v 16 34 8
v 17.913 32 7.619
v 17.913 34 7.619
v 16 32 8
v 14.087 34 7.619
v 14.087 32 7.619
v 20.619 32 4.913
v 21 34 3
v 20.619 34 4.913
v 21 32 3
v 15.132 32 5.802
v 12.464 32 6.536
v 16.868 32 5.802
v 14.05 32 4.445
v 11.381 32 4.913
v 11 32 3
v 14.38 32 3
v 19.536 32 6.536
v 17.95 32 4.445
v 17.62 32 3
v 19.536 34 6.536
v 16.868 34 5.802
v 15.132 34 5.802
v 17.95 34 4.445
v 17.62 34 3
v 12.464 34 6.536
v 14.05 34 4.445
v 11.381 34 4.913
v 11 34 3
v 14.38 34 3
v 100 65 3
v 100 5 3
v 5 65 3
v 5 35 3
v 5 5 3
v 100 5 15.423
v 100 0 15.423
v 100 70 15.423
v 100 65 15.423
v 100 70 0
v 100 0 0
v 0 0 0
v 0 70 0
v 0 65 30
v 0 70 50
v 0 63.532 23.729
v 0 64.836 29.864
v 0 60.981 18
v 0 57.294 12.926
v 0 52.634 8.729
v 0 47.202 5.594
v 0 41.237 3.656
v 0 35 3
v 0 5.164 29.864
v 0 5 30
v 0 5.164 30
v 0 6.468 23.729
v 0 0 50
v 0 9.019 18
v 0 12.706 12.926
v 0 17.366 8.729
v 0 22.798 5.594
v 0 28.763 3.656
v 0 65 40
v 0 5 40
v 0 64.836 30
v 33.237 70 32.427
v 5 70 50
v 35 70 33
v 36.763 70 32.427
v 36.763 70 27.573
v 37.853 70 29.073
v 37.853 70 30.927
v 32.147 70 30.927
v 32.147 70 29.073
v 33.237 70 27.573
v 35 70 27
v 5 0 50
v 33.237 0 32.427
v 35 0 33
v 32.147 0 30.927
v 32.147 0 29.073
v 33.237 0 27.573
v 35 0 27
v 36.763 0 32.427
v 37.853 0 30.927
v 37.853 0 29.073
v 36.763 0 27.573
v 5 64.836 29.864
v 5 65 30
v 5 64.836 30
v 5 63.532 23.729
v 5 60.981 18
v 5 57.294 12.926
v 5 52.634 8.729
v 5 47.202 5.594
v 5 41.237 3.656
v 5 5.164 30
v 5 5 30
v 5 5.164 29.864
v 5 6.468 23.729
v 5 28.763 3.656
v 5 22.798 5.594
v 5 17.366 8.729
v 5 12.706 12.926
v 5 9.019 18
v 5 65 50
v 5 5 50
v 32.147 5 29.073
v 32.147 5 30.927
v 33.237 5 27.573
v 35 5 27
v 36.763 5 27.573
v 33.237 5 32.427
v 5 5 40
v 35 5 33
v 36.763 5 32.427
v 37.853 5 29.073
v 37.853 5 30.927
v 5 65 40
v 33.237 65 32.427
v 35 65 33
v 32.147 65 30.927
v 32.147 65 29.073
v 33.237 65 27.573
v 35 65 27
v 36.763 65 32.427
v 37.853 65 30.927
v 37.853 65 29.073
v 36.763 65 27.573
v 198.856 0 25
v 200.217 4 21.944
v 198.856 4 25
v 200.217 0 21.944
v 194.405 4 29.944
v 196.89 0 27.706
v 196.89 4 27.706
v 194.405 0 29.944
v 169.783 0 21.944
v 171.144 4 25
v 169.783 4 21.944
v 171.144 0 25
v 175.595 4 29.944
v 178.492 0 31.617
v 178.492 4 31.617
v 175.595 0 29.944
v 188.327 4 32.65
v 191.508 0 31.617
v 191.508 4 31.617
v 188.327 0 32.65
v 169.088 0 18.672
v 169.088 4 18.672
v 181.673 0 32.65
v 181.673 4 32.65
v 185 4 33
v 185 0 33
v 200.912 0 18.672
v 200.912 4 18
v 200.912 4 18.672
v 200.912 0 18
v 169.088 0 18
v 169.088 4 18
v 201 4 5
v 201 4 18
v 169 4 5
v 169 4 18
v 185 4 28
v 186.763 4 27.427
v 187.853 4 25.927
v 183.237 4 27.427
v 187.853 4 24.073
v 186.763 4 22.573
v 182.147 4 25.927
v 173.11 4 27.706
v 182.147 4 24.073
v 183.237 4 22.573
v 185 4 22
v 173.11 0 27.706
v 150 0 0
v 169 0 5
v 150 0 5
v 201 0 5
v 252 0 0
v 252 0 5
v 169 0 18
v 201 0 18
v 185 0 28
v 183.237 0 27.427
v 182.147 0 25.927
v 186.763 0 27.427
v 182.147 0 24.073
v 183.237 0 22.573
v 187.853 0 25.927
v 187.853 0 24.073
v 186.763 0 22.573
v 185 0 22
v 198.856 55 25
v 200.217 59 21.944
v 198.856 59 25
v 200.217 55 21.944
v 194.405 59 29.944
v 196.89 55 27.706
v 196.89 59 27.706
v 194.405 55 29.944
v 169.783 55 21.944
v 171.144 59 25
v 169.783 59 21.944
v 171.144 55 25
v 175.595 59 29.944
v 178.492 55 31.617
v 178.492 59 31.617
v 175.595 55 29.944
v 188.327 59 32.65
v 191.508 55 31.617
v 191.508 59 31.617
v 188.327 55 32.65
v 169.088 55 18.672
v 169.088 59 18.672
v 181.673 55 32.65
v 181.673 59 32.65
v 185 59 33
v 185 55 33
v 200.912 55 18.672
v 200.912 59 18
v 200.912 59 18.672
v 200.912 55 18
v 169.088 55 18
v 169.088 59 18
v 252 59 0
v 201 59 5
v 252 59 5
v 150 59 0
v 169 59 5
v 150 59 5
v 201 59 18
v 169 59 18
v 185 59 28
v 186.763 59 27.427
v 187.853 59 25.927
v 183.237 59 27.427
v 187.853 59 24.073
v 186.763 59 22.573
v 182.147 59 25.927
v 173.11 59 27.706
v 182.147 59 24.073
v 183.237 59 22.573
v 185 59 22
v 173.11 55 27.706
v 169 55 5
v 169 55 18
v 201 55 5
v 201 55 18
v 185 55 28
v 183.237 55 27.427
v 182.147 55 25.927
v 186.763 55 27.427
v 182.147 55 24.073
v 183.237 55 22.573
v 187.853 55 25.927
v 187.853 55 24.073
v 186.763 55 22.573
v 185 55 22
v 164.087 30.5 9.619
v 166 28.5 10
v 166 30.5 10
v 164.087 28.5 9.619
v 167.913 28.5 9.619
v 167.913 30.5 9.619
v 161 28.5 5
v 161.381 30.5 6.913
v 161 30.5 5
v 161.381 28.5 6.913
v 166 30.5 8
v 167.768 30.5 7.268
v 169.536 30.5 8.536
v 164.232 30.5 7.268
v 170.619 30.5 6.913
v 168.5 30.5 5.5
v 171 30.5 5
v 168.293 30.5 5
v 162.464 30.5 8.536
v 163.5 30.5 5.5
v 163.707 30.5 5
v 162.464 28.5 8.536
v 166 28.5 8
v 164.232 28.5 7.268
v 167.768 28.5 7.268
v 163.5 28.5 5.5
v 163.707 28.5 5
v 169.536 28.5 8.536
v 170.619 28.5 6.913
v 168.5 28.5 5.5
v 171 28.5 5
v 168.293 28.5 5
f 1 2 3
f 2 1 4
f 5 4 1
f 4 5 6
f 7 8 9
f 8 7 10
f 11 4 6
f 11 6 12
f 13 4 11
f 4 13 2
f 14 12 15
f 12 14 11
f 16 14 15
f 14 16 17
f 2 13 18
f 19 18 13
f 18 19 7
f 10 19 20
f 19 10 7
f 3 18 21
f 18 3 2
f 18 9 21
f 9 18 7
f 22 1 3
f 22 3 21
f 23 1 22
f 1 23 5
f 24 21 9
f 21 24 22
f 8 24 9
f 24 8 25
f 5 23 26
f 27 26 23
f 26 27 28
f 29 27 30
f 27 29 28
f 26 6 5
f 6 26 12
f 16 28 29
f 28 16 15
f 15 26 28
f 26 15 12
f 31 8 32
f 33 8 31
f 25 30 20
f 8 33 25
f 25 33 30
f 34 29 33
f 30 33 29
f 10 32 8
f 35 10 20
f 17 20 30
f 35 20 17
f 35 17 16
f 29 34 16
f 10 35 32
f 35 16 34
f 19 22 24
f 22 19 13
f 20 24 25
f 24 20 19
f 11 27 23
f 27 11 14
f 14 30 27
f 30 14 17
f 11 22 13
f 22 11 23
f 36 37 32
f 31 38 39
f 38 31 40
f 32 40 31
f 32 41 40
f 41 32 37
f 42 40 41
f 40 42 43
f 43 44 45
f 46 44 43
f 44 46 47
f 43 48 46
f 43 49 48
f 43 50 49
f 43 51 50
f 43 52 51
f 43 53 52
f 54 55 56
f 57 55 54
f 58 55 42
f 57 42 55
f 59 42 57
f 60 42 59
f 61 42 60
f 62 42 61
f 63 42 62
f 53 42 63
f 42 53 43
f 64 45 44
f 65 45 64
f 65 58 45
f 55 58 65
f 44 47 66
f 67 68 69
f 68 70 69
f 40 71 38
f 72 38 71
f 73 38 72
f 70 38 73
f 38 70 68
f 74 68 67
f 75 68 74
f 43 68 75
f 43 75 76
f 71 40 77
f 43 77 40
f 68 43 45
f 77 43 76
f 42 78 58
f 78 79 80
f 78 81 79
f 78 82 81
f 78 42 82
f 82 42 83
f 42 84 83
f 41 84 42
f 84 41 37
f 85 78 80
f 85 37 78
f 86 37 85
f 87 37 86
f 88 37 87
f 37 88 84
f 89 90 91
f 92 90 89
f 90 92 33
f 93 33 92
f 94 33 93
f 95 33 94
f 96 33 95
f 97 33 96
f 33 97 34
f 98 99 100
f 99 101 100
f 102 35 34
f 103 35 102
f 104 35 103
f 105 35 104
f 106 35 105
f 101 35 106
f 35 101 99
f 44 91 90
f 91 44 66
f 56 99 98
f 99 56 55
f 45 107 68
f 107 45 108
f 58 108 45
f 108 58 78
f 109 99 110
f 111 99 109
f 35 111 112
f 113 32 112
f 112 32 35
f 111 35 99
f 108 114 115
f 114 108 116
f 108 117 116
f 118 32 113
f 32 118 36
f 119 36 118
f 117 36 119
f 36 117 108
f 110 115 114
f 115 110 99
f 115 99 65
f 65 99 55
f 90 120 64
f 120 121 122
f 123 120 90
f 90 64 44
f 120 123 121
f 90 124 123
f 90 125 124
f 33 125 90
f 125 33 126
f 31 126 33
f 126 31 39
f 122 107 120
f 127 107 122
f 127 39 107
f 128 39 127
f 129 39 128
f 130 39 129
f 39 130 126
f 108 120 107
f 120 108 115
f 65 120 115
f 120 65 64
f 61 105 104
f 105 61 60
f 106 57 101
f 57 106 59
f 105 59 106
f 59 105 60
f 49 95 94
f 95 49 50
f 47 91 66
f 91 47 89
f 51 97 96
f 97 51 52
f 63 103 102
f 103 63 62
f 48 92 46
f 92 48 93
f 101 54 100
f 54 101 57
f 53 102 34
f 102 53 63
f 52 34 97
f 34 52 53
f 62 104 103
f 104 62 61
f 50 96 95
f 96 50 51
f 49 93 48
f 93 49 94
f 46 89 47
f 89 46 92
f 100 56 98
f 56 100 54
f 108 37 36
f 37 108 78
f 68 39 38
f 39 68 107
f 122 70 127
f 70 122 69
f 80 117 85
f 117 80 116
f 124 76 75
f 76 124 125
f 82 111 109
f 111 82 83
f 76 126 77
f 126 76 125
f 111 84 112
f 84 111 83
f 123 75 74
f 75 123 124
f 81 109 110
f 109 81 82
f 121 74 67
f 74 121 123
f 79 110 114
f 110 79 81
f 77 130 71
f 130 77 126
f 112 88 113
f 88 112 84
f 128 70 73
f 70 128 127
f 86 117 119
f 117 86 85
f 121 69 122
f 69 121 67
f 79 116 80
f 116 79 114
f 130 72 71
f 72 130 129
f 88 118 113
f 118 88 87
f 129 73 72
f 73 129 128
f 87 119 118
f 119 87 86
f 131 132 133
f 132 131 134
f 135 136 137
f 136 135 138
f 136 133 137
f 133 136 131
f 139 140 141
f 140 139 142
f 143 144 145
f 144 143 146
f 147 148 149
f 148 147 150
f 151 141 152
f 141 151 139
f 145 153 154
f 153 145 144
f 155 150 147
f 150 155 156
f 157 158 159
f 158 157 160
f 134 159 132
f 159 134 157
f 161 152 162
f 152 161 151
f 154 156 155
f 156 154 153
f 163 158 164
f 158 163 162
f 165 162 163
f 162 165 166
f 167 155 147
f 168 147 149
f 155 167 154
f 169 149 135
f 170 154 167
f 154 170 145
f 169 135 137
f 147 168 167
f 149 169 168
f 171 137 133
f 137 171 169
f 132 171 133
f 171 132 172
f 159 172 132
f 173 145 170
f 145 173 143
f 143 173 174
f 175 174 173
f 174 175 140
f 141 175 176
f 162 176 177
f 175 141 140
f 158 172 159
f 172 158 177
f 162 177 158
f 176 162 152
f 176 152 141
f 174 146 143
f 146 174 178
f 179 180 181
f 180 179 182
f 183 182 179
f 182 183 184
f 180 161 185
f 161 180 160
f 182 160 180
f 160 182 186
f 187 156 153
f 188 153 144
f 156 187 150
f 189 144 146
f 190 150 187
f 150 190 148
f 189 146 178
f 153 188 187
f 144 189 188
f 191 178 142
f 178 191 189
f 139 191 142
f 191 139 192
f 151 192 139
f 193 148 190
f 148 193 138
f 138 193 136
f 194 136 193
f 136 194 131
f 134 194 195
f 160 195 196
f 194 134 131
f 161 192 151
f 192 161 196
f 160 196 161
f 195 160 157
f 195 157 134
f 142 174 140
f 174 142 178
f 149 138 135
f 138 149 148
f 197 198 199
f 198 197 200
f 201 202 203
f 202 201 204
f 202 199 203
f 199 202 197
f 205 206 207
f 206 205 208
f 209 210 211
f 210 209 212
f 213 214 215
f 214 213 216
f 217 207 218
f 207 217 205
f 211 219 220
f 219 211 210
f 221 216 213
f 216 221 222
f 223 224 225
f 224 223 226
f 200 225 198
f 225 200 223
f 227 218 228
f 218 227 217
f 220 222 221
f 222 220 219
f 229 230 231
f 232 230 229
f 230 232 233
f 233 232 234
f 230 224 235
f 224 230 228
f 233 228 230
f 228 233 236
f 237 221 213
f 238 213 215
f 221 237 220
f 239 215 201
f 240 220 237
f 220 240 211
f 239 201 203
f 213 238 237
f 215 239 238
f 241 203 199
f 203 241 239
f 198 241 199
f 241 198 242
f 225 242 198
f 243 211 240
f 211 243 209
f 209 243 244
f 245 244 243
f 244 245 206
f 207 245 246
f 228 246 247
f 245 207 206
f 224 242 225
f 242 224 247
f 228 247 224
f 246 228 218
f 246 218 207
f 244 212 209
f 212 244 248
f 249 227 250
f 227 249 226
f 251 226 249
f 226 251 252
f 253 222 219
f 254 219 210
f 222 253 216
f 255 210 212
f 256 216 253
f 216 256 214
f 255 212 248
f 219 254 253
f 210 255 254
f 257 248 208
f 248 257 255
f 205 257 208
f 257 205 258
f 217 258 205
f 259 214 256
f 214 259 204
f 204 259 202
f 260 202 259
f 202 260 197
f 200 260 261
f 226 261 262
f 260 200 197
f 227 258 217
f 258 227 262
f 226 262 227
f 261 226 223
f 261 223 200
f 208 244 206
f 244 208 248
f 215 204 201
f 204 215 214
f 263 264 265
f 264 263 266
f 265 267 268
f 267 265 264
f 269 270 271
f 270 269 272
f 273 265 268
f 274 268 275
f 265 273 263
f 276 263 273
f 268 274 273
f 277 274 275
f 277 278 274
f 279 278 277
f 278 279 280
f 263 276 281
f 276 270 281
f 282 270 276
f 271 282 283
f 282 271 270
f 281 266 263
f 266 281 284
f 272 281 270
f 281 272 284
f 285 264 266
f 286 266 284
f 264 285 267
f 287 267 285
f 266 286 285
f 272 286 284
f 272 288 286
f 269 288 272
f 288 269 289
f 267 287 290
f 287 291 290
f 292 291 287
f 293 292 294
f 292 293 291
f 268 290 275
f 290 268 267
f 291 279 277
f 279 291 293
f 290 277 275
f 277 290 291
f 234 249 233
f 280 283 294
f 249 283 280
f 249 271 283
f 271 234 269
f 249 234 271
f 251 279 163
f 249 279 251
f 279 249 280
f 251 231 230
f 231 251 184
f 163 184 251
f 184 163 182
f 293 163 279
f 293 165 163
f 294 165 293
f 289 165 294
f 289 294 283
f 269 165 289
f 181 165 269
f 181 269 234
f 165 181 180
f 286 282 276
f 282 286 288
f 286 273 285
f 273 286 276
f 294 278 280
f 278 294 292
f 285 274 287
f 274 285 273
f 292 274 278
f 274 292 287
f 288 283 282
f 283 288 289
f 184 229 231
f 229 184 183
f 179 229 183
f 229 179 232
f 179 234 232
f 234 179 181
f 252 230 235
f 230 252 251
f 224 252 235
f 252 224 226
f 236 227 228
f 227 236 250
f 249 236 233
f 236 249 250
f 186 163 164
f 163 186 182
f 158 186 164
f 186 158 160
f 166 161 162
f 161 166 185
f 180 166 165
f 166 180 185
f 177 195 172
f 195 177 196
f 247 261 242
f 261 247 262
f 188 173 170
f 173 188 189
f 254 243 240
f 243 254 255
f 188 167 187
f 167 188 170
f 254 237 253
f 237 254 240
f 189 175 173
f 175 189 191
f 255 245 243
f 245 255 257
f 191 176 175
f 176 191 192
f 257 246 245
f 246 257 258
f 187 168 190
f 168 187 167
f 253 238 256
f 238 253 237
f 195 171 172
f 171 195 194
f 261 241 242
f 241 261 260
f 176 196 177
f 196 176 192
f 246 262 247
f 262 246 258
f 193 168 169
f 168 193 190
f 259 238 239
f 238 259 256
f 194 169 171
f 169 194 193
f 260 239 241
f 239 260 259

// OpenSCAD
	base_plate_width = 100;
base_plate_length = 70;
base_plate_height = 3;
base_plate_dimensions = [base_plate_width,base_plate_length,base_plate_height];

up_plate_width = 5;
up_plate_length = 70;
up_plate_height = 30;
up_plate_dimensions = [up_plate_width,up_plate_length,up_plate_height];

wall_plate_width= 100;
wall_plate_length = 5;
wall_plate_height = 50;
wall_plate_dimensions = [wall_plate_width,wall_plate_length,wall_plate_height];


module halfcylinder(he,rd) {
	difference(){
		cylinder (h=he,r=rd);
		translate([0,-rd-0.1,-0.1]) cube([rd+0.1,rd*2+0.2,he+0.2]);
	} // df
} // mod


cylinder_radius = 15;
cylinder_height = 5;


//projection(){
translate([0,0,0])
rotate([0,0,0])
difference(){

	union(){
		cube(base_plate_dimensions);
		cube(up_plate_dimensions);
		cube(wall_plate_dimensions);
		
		
		translate([0,base_plate_length-wall_plate_length,0])
		//color("white")
		cube(wall_plate_dimensions);
		 
	// backwall strebe oben
	//color("blue")
	translate([0,0,40])
	cube([5,70,10]);
			
	
		// spring hook
		translate([16, base_plate_length/2-1,3 ])	
		difference(){	
			rotate([90,90,0])
			//color("black")
			halfcylinder(2,5);
			
			// wahrscheinlich hook loch
			rotate([90,90,0])
			translate([-1,0,0])
			//color("yellow")
			cylinder(d = 4, h=20, center = true);	
			}
	}
	
	
	//angles
	translate([5,-1,50])
	rotate([0,-340,0])
	//color("blue")
	cube([base_plate_width+5, base_plate_length+10, base_plate_height+30]);	
	
	// angle holes
	translate([35,-10,30])
	color("purple")
	rotate([270,90,0])
	cylinder(h=120, r=3);
	
	// backwall hole
	union(){
	translate([6,35,33])
	rotate([0,270,0])
	color("black")
	halfcylinder(15, 30);
	
		

	}
	
//}
}

// top plate

base2_plate_width = 102;
base2_plate_length = 59;
base2_plate_height = 5;
base2_plate_dimensions = [base2_plate_width,base2_plate_length,base2_plate_height];


cylinder2_radius = 16;
cylinder2_height = 4;


//projection(){
//translate([0,70,55])
//rotate([180,0,0])

translate([150,59,55])
rotate([180,0,0])
difference(){
	union(){
		// base plate
		translate([0,0,50])
		cube(base2_plate_dimensions);
		
		//angle
		translate([19,0,37])
		//color("white")
		cube([cylinder2_radius*2, cylinder2_height, 16]);
		
		// angle
		rotate([270,270,0])
		translate([38,35,base2_plate_length-4])
		halfcylinder(cylinder2_height,cylinder2_radius);

		// angle
		translate([19,base2_plate_length-4,37])
		//color("black")
		cube([cylinder2_radius*2, cylinder2_height, 16]);
		
		// angle
		rotate([270,270,0])
		translate([38,35,0])
		halfcylinder(cylinder2_height,cylinder2_radius);
		
		// hook
		
		translate([16, base2_plate_length/2+1, 50])		
		difference(){	
			
			rotate([90,270,0])
			//color("black")
			halfcylinder(2,5);
			
			translate([0,0,-0.5])
			rotate([90,90,0])
			cylinder(d = 5, h=20, center = true);	
			} 
	}	
	
	translate([35,-10,30])
	//color("purple")
	rotate([270,90,0])
	cylinder(h=120, r=3);
//}
}
